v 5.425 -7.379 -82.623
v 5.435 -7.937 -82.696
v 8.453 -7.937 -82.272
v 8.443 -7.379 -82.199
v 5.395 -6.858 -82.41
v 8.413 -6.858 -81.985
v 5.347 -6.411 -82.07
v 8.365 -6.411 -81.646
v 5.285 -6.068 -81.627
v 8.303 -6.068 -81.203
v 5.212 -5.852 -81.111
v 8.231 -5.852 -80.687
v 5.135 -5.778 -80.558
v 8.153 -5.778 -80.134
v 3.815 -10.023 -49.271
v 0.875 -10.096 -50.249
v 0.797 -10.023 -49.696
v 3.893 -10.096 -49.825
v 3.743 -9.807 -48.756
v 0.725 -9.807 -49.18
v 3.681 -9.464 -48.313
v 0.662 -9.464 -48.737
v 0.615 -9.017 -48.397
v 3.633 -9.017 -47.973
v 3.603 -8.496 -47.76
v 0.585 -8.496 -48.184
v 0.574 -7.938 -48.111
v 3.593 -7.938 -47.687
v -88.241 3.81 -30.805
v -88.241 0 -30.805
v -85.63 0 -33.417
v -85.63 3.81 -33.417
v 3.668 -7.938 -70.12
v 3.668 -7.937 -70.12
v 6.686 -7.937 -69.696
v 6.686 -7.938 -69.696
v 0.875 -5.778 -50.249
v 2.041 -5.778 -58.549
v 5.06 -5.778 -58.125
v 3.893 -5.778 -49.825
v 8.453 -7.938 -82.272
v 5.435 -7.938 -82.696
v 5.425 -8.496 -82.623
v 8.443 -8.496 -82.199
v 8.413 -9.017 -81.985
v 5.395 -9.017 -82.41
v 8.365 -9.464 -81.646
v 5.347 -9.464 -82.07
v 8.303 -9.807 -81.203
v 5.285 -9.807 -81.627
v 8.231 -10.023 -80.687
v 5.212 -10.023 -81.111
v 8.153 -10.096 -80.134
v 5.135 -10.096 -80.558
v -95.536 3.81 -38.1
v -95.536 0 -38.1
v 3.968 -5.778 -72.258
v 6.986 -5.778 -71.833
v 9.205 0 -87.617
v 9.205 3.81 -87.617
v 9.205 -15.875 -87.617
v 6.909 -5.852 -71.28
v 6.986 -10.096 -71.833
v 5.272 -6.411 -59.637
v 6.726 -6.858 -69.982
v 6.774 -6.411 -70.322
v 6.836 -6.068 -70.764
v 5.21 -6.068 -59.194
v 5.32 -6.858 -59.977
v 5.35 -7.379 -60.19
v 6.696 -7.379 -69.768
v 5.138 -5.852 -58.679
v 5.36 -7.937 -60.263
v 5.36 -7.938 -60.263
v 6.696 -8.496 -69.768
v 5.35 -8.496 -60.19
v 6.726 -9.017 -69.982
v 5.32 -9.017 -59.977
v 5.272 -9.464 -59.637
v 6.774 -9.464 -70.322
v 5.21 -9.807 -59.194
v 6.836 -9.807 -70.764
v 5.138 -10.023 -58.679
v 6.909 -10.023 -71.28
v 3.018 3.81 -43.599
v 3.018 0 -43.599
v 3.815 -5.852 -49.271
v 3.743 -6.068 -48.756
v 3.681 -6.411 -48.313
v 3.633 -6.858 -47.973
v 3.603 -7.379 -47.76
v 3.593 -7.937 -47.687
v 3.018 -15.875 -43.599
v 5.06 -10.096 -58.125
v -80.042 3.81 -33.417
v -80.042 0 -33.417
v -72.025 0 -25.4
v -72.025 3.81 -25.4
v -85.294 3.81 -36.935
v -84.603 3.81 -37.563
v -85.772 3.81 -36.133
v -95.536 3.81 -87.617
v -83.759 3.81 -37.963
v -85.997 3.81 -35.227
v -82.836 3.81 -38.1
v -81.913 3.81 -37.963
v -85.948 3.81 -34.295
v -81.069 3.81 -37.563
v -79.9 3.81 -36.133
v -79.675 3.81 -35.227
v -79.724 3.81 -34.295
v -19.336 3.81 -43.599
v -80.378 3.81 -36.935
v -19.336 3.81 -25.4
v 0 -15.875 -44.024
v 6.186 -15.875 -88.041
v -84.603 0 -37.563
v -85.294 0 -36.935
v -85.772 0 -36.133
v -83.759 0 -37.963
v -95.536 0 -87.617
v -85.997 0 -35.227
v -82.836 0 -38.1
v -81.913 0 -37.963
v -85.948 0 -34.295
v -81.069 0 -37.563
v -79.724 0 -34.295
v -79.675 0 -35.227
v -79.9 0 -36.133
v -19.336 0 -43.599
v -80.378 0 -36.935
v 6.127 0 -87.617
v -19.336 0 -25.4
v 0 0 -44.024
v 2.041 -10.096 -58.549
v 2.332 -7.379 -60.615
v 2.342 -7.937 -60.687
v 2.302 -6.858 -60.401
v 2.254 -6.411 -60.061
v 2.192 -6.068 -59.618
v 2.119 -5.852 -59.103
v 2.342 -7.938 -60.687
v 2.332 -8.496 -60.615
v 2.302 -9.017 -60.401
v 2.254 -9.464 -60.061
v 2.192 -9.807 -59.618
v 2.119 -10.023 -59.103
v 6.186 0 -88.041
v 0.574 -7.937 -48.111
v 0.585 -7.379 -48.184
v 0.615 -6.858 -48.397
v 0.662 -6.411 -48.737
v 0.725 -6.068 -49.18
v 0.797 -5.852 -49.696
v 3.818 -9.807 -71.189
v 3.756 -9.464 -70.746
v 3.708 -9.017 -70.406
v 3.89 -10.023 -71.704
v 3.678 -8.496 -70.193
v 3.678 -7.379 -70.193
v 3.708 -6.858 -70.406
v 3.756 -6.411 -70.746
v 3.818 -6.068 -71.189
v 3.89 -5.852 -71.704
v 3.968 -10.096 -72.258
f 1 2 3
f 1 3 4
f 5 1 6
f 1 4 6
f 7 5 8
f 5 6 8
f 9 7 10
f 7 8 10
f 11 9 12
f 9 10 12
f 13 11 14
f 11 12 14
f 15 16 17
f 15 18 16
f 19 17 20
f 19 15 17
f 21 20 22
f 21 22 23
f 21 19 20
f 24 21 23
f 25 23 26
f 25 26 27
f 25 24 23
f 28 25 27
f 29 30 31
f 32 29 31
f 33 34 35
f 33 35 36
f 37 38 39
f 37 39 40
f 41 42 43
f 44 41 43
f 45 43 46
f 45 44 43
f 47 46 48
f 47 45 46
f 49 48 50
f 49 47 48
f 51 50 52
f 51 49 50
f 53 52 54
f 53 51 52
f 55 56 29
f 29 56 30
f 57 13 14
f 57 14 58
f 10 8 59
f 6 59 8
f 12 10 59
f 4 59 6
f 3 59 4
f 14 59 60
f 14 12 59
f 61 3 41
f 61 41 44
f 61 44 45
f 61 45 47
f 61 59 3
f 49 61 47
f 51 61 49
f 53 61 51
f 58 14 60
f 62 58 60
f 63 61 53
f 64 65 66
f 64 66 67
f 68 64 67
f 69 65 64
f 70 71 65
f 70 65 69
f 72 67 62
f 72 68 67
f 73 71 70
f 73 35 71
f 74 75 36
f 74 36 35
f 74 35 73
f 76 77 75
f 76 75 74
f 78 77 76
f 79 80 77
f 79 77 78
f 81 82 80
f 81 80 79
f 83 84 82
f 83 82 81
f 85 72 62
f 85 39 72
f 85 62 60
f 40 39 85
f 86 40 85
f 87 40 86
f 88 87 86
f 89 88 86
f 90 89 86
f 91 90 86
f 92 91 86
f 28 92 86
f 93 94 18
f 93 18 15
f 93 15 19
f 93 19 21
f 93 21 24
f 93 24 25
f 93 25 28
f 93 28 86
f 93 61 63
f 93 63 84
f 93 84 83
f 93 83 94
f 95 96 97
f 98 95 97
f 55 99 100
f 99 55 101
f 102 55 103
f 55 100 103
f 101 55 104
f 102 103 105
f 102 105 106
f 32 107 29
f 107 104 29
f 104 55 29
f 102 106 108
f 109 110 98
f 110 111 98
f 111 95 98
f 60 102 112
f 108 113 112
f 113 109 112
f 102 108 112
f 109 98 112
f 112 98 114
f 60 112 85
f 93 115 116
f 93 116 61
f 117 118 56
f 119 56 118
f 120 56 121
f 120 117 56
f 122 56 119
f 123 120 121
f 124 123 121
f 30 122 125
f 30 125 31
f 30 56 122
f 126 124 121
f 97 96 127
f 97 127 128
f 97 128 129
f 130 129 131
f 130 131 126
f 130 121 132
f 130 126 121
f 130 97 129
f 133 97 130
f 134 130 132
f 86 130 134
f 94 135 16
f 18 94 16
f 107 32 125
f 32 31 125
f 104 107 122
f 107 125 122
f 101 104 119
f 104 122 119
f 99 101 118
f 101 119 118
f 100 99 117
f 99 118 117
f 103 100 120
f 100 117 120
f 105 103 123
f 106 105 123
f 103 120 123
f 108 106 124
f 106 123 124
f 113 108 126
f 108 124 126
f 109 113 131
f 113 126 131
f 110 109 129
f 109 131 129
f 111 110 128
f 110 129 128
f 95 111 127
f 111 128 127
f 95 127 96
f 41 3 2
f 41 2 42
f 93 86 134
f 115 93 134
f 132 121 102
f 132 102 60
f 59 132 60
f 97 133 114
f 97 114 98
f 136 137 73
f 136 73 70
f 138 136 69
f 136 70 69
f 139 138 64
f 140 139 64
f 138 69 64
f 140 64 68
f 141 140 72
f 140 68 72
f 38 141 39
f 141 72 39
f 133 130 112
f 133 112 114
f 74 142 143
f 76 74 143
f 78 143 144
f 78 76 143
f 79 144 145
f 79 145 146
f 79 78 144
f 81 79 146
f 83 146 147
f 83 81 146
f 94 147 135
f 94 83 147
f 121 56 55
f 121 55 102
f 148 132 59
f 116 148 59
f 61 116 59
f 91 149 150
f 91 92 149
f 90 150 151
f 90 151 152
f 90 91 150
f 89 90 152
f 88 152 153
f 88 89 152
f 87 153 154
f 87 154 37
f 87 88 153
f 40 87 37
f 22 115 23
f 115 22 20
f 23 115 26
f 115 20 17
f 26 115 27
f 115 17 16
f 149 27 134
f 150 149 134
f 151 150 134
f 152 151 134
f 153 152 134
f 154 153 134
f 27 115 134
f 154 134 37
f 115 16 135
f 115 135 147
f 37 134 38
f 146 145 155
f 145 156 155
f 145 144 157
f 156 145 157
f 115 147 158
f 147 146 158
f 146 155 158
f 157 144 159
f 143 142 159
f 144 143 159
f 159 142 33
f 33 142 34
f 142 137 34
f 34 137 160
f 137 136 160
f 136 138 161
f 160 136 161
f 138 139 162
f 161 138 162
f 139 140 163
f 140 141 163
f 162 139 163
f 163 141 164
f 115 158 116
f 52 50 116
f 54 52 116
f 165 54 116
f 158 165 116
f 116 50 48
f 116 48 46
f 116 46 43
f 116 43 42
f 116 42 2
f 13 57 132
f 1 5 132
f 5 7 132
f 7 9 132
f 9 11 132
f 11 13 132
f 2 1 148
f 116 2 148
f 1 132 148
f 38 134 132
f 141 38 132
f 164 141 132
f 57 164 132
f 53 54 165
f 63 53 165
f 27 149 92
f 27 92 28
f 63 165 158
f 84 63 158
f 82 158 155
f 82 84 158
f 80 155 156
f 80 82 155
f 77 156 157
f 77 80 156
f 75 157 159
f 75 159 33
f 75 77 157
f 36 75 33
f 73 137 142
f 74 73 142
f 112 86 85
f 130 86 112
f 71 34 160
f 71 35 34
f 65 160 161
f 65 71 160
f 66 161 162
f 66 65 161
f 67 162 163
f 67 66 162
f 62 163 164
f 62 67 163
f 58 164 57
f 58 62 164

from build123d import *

# Parameters (mm, degrees)
F1_DEPTH  = 15.875
F2_W      = 4.318
F2_H      = 12.7
F3_DEPTH  = 9.175040233
F4_R      = 2.15899
F5_R      = 3.175
F6_DEPTH  = 3.81
F8_DEPTH  = 25.4
F10_DEPTH = 25.4


# Not quite as in the source:
# - a fillet or chamfer is up to 0.001 mm smaller than in the source, because OpenCascade refuses the exact size


with BuildPart() as f1:
    # F0 (on Front) → F1 (new body)
    with BuildSketch(Plane.XZ):
        Polygon((9.2045814112, -87.6168819653), (3.0183370735, -43.5994663098), (0, -44.0236659215), (6.1862443377, -88.041081577), align=None)
    extrude(amount=F1_DEPTH)

    # F2 (on face) → F3 (cut, through all)
    with BuildSketch(Plane(origin=(-6.067283434, 0, -0.8527010782), x_dir=(0, -1, 0), z_dir=(-0.9902680687, 0, -0.139173101))):
        with Locations((7.9375, -54.072730631)):
            Rectangle(F2_W, F2_H)
        with Locations((7.9375, -76.297730631)):
            Rectangle(F2_W, F2_H)
    extrude(amount=-F3_DEPTH, mode=Mode.SUBTRACT)

    # F4 (radius 2.159 in the source; OpenCascade refuses exactly that, so slightly less here)
    f4_edges = [f1.edges().sort_by_distance(p)[0] for p in [
        (2.083606, -5.7785, -47.898898),
        (5.176728, -5.7785, -69.907605),
        (5.176728, -10.0965, -69.907605),
        (2.083606, -10.0965, -47.898898),
        (3.851104, -10.0965, -60.475302),
        (6.944226, -10.0965, -82.48401),
        (6.944226, -5.7785, -82.48401),
        (3.851104, -5.7785, -60.475302),
    ]]
    fillet(f4_edges, radius=F4_R)

    # F5 (on Front) → F6 (join)
    with BuildSketch(Plane.XZ):
        Polygon((9.2045814112, -87.6168819653), (3.0183370735, -43.5994663098), (-19.3359767612, -43.5994663098), (-19.3359767612, -25.4), (-95.5359767612, -25.4), (-95.5359767612, -87.6168819653), align=None)
        with Locations((-82.8359767612, -34.925)):
            Circle(F5_R, mode=Mode.SUBTRACT)
    extrude(amount=-F6_DEPTH)

    # F7 (on Front) → F8 (cut)
    with BuildSketch(Plane.XZ):
        Polygon((-95.5359767612, -25.4), (-95.5359767612, -38.1), (-82.8359767612, -25.4), align=None)
    extrude(amount=-F8_DEPTH, mode=Mode.SUBTRACT)

    # F9 (on Front) → F10 (cut)
    with BuildSketch(Plane.XZ):
        Polygon((-70.1359767612, -23.5109585549), (-72.0250182062, -25.4), (-70.1359767612, -25.4), align=None)
        Polygon((-93.6469353161, -25.4), (-82.8359767612, -36.2109585549), (-72.0250182062, -25.4), align=None)
    extrude(amount=-F10_DEPTH, mode=Mode.SUBTRACT)


solid = f1.part
